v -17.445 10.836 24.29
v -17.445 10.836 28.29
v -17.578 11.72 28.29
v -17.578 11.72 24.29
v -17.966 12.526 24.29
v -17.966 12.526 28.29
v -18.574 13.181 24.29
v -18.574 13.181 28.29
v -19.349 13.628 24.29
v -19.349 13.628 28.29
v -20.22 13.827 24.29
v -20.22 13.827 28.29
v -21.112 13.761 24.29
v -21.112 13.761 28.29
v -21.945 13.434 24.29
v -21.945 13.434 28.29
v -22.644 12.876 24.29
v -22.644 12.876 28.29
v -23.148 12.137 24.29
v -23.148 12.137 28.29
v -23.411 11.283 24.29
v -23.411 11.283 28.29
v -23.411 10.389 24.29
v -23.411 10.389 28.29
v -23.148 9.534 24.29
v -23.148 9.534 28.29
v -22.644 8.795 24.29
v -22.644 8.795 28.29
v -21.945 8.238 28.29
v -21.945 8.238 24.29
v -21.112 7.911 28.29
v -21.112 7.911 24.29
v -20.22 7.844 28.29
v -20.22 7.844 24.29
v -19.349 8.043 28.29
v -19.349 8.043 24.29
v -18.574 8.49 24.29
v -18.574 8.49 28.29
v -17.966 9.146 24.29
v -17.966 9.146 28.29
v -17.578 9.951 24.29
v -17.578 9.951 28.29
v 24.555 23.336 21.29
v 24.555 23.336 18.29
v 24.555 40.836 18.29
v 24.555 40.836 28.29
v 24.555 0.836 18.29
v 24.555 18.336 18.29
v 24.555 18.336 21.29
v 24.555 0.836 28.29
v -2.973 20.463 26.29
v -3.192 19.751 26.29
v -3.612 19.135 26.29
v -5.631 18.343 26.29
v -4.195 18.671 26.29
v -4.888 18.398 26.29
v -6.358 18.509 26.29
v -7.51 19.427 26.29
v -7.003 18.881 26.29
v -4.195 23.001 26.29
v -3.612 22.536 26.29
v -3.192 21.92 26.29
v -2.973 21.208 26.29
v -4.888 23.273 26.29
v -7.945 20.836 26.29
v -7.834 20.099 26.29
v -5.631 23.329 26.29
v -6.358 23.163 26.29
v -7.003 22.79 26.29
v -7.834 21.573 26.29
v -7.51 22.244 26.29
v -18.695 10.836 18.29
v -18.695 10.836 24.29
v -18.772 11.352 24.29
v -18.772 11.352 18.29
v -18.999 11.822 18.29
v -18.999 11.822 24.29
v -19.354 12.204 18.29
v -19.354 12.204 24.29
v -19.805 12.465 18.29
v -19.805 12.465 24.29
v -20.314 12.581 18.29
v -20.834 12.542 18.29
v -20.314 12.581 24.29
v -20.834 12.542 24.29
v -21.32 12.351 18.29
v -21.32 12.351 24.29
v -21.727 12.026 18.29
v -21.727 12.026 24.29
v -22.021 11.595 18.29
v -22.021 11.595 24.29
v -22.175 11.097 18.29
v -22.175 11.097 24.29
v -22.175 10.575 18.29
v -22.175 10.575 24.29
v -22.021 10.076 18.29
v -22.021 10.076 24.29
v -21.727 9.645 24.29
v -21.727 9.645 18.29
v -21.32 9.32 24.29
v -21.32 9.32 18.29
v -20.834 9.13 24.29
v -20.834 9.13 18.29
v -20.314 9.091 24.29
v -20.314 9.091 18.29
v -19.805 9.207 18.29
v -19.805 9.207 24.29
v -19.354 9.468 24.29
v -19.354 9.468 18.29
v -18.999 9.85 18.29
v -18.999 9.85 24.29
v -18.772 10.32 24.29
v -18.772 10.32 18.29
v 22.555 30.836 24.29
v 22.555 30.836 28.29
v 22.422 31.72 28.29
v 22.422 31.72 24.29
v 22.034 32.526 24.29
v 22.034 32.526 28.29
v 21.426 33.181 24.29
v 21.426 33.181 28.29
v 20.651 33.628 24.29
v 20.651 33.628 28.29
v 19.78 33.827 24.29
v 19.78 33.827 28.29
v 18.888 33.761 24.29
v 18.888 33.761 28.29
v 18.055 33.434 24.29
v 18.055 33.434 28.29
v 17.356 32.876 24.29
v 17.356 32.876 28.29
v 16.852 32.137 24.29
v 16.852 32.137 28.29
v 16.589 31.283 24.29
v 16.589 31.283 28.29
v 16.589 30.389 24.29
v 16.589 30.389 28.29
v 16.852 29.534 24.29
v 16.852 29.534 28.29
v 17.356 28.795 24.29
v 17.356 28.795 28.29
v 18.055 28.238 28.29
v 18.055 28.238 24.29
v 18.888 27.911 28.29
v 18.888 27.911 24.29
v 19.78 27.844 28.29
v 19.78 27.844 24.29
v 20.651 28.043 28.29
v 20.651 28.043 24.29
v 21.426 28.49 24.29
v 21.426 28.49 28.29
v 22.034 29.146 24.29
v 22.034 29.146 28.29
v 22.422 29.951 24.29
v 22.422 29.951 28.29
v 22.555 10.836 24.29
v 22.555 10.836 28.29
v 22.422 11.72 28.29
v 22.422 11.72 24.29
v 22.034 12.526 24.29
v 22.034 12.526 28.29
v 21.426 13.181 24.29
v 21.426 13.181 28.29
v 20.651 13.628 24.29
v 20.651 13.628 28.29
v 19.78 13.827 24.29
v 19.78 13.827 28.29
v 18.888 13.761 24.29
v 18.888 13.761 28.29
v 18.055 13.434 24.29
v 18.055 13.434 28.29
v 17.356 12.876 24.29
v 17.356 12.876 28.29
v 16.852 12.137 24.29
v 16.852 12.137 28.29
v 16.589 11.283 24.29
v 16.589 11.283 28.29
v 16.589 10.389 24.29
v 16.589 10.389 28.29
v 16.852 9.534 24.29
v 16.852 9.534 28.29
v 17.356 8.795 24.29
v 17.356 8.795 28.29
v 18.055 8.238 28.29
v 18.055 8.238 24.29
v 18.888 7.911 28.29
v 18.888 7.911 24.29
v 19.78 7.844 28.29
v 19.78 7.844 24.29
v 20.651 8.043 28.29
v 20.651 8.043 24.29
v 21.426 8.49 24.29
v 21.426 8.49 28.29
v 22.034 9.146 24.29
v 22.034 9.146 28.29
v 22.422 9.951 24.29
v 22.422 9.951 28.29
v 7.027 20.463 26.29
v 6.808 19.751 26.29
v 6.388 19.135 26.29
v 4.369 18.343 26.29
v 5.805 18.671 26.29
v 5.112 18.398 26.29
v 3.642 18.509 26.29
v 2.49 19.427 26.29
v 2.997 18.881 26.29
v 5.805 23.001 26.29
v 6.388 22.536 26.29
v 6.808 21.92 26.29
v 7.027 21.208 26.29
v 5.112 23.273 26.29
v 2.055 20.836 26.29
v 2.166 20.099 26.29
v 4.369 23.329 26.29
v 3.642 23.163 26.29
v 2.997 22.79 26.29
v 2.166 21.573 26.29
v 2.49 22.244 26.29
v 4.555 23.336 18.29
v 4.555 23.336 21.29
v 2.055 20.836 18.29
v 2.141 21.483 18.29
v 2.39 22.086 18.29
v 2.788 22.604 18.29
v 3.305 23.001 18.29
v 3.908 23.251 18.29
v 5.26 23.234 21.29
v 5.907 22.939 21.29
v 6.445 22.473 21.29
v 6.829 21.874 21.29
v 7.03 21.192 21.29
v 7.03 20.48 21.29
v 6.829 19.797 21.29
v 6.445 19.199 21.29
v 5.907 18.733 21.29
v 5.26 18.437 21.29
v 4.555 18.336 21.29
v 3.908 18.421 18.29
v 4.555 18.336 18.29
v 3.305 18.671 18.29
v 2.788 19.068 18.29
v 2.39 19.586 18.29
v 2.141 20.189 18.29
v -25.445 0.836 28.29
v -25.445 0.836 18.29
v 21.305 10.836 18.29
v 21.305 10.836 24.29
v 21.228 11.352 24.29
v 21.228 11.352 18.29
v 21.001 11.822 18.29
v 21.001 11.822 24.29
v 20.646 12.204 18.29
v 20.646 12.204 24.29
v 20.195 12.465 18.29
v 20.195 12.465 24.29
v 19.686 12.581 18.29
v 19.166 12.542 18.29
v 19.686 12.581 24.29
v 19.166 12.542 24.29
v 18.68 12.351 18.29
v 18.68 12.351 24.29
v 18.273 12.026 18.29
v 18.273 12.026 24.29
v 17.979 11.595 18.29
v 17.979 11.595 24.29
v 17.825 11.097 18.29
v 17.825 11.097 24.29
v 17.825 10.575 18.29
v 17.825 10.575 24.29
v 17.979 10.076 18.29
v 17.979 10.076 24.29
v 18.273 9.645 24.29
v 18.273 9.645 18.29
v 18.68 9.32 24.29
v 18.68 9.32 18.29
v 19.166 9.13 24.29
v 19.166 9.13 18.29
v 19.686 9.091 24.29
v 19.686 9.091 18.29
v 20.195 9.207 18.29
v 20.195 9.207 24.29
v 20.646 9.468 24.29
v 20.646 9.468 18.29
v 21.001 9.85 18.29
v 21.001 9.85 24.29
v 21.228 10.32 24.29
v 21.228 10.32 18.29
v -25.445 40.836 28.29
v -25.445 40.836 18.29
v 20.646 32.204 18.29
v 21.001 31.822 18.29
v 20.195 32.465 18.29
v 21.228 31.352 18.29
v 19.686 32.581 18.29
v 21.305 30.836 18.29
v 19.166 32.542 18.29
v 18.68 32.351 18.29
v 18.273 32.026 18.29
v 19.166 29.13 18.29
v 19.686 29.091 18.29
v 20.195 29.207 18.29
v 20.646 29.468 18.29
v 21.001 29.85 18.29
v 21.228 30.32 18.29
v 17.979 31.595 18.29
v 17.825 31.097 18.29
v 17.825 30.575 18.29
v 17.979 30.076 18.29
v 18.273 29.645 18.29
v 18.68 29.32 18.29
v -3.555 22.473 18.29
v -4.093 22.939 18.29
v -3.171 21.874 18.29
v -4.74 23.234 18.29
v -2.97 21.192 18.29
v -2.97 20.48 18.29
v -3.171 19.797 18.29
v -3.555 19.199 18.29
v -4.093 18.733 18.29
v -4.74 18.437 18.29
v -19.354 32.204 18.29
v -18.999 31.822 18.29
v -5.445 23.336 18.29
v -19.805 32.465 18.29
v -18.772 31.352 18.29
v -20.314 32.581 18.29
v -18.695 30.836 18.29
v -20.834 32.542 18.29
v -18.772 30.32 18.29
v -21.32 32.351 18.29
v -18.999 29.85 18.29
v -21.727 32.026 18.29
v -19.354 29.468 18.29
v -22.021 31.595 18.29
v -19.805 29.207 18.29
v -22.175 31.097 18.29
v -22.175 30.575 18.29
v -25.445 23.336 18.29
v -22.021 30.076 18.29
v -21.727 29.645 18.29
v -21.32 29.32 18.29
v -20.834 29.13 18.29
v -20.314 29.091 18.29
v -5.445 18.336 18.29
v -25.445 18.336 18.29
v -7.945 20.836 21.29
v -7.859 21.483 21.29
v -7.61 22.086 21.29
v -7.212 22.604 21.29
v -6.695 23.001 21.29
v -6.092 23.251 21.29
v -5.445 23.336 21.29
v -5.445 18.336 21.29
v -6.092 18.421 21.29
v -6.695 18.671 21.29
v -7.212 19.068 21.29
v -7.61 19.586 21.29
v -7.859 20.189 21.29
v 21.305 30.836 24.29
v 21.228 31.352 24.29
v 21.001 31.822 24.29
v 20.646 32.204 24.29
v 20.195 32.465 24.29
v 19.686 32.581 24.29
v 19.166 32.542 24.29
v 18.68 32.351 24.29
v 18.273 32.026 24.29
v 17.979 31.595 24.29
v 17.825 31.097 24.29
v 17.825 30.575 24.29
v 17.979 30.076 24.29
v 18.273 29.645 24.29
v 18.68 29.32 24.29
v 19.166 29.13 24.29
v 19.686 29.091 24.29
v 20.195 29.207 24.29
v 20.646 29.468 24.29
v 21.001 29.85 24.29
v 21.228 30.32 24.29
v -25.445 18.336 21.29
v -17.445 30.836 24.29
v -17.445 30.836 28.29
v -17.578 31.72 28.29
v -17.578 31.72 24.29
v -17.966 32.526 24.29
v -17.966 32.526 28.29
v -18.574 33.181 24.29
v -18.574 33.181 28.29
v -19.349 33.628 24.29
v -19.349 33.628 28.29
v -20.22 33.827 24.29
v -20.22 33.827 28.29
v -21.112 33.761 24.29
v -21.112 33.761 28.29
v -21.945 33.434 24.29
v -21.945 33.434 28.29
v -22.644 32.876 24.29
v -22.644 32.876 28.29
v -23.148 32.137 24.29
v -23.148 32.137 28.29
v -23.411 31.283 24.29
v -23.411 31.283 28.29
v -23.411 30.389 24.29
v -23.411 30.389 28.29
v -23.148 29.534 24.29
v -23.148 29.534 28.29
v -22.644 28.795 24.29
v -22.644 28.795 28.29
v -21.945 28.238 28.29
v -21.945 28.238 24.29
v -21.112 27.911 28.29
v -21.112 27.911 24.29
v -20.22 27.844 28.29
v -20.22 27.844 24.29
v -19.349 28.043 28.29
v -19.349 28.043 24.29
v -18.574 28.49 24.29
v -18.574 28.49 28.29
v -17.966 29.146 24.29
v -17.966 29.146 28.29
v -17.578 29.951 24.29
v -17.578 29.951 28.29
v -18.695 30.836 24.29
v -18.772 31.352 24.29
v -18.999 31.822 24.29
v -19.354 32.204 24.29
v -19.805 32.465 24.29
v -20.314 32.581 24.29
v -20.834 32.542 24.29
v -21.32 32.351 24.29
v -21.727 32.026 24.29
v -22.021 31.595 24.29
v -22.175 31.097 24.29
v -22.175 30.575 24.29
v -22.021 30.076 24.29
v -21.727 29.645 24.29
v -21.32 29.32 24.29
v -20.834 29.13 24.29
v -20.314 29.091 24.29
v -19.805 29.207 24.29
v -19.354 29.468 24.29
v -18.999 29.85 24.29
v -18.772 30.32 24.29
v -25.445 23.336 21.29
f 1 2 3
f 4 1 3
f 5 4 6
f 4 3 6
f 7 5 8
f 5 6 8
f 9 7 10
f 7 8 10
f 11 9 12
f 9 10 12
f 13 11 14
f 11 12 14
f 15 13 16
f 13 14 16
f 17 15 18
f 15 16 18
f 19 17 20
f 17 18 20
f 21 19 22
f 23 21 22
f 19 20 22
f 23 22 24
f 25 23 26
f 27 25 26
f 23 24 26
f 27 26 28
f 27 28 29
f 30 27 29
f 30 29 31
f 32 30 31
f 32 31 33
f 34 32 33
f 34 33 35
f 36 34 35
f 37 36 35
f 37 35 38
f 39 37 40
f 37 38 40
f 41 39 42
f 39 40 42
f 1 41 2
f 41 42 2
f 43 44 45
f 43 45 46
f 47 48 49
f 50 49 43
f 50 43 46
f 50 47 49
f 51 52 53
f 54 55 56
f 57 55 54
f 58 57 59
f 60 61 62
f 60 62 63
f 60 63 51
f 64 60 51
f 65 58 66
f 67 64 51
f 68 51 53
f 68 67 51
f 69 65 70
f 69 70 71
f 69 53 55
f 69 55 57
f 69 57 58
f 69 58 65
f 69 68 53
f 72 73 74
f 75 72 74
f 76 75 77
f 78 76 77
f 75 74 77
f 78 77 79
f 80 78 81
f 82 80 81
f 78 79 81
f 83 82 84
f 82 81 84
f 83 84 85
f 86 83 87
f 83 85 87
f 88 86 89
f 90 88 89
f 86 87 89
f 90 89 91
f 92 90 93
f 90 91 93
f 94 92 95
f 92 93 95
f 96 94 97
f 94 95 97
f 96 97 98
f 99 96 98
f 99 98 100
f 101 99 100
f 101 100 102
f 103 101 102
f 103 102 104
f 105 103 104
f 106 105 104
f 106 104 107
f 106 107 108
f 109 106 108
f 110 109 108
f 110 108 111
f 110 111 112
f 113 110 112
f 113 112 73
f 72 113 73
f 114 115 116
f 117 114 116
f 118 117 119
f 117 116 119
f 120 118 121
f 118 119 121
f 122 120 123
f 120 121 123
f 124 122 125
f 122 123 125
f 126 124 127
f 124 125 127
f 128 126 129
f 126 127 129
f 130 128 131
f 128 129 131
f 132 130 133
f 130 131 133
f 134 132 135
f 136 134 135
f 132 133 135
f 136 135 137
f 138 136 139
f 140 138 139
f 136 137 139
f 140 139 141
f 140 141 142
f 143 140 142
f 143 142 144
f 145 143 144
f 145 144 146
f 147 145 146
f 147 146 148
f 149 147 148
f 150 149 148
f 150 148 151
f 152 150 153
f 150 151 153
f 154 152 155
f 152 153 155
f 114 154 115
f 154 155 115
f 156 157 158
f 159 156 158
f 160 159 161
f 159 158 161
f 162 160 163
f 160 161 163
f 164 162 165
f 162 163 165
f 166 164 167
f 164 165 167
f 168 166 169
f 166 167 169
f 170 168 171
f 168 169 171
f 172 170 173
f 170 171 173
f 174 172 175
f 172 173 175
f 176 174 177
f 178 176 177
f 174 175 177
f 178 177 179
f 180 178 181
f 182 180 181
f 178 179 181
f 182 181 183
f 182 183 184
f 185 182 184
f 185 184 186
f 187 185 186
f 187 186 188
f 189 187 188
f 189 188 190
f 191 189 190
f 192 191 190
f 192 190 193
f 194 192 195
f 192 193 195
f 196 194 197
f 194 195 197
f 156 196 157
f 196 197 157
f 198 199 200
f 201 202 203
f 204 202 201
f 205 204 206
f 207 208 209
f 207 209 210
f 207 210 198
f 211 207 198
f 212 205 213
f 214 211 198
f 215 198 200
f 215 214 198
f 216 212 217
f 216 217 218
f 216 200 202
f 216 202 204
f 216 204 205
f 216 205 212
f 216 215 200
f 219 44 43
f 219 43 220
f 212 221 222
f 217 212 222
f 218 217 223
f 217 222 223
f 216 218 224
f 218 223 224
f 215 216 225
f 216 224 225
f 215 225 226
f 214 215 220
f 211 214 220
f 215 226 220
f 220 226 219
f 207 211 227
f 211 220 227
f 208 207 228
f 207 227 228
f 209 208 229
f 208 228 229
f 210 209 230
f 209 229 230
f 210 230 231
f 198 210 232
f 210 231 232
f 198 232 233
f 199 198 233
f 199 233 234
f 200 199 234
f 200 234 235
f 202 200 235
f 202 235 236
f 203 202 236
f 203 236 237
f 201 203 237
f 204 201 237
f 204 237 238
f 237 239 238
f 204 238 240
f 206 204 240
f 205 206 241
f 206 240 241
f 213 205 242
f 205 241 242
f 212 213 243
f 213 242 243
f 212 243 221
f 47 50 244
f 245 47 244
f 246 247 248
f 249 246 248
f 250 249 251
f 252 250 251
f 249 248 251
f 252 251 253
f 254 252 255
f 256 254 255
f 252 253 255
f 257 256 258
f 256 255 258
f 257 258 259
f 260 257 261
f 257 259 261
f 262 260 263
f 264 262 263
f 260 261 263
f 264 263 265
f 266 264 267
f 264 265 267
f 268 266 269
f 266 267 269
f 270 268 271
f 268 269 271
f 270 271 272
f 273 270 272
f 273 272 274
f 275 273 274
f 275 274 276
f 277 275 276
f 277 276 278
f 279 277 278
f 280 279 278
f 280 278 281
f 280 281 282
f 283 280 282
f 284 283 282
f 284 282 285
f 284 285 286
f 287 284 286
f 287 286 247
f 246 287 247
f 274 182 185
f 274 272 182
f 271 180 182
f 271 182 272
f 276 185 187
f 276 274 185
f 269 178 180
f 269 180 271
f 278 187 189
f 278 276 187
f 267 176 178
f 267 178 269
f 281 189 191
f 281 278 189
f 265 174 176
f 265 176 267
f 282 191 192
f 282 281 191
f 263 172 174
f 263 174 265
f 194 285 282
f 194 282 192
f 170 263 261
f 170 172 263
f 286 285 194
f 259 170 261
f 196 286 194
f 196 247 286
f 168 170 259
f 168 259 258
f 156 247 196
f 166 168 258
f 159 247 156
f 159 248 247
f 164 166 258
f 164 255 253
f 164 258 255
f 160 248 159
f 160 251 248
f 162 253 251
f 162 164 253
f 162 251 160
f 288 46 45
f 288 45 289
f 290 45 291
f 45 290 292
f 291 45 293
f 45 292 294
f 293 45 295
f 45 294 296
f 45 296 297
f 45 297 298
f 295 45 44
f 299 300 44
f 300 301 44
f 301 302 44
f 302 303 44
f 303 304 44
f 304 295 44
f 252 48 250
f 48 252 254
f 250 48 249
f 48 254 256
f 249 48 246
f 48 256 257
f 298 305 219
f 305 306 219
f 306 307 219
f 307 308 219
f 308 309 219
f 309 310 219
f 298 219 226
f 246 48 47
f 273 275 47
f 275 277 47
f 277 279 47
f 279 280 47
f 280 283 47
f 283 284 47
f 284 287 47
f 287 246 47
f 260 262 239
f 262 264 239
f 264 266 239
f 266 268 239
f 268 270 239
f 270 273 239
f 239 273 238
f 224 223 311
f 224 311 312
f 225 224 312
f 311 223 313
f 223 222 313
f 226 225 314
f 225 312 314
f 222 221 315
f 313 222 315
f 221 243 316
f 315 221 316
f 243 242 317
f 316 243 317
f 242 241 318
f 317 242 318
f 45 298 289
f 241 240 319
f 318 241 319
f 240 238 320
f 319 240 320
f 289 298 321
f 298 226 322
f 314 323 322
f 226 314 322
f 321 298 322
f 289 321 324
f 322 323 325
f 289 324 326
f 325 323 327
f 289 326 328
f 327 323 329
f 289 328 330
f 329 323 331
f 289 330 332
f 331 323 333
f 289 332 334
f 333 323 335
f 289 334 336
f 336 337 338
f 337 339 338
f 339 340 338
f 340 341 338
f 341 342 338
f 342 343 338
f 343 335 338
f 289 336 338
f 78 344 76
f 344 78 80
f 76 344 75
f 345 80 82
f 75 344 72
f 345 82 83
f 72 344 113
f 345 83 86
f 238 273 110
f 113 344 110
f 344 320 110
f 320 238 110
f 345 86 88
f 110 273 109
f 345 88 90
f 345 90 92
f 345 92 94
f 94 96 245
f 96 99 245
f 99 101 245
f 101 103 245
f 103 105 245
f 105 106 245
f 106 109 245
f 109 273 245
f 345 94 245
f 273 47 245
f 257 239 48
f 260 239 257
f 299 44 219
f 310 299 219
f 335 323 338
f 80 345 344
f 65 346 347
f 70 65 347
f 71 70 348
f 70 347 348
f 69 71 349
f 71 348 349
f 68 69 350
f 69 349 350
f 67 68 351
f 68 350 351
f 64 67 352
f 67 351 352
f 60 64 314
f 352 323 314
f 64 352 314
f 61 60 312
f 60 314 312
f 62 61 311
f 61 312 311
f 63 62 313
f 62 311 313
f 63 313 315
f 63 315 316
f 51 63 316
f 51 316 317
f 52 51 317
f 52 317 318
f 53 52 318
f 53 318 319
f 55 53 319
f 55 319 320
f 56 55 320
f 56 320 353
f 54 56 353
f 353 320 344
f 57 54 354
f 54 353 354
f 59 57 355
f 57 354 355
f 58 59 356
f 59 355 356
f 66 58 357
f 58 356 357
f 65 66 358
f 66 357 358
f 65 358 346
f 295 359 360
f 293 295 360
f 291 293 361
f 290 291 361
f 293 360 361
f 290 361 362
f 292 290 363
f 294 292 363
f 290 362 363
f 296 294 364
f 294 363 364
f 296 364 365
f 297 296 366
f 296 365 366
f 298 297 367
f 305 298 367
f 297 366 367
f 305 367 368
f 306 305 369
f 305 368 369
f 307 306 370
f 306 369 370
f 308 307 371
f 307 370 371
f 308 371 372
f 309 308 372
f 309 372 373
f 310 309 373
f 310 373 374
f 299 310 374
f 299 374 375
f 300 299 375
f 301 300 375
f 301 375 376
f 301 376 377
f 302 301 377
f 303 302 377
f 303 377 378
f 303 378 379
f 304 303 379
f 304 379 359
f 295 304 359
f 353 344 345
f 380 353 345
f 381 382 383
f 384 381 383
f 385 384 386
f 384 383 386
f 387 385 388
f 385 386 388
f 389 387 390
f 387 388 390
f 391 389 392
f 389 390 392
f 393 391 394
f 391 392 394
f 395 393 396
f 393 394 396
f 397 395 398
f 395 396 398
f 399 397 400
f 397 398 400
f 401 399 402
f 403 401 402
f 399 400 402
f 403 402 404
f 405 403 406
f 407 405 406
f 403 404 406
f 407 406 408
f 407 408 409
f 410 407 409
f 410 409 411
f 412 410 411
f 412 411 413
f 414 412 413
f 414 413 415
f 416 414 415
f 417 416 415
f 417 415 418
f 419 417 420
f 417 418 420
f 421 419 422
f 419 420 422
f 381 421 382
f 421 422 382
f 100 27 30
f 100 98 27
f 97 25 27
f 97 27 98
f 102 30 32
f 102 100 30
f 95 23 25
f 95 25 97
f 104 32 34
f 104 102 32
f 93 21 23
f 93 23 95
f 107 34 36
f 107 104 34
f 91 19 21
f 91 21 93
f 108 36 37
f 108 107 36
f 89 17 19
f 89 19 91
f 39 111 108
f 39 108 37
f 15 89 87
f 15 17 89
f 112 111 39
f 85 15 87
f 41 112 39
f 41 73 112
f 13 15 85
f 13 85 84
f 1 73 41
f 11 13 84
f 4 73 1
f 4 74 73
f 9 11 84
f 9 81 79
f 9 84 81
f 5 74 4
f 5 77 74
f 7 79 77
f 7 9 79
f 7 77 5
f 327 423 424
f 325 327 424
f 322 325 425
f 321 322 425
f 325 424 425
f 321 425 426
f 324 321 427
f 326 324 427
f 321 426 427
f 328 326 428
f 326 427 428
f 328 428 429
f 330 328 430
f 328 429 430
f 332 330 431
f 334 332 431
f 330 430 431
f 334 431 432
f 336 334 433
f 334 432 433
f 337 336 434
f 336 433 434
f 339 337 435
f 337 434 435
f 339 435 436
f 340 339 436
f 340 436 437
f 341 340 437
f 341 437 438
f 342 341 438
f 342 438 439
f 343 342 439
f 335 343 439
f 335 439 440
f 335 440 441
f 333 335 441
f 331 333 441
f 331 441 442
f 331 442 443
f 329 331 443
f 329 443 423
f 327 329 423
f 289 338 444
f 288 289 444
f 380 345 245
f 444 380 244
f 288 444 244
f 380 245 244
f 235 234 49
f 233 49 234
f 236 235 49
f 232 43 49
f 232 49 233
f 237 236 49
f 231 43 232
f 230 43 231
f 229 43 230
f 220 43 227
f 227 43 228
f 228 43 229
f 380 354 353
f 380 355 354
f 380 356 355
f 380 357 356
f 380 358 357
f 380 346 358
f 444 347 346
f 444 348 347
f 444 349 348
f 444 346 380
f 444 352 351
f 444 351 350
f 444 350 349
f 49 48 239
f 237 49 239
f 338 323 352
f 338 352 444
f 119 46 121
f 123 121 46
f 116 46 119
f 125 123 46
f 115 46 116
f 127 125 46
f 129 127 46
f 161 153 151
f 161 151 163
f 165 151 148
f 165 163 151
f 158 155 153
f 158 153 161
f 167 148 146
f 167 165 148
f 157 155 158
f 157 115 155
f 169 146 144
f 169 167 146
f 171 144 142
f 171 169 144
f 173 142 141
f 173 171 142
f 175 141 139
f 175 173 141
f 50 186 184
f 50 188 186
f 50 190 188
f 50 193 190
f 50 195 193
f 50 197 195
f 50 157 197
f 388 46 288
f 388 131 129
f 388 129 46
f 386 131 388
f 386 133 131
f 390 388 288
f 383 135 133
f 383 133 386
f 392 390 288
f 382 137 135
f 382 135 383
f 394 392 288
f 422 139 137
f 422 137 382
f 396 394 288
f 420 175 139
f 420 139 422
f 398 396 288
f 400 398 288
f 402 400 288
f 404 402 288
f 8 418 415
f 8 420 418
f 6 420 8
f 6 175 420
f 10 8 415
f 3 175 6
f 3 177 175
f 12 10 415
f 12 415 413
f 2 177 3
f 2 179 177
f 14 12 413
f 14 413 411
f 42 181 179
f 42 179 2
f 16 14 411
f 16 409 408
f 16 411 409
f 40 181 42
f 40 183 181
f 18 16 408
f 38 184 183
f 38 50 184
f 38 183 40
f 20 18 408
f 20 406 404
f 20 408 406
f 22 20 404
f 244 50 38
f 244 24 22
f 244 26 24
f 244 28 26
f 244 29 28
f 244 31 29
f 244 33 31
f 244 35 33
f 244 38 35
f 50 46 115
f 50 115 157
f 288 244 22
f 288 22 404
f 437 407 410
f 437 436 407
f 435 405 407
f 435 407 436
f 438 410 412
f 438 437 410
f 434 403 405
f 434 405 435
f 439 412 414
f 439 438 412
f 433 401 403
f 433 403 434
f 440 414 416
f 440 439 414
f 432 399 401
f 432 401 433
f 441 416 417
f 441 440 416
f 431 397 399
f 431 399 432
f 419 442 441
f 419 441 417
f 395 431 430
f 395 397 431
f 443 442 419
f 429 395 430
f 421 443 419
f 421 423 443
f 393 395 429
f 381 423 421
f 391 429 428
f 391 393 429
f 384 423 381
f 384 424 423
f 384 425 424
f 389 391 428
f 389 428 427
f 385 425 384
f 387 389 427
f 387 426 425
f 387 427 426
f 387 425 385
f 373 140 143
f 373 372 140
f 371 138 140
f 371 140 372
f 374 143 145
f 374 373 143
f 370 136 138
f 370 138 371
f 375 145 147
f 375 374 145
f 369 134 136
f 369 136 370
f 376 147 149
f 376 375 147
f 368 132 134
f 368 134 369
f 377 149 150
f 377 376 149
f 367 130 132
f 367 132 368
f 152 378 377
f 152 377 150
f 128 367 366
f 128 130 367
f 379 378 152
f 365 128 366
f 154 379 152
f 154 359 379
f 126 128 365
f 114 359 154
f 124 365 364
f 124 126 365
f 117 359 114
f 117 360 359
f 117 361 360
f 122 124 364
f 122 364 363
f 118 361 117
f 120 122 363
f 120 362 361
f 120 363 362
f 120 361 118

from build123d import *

# Parameters (mm, degrees)
SKETCH1_W           = 50
SKETCH1_H           = 10
BOSS_EXTRUDE1_DEPTH = 40
CUT_EXTRUDE1_REACH  = 12
SKETCH2_R           = 1.75
SKETCH3_R           = 3
CUT_EXTRUDE2_DEPTH  = 4
SKETCH5_R           = 2.5
CUT_EXTRUDE3_DEPTH  = 8
SKETCH6_W           = 20
SKETCH6_H           = 5
CUT_EXTRUDE4_DEPTH  = 3


with BuildPart() as part:
    # Sketch1 → Boss-Extrude1 (new body)
    with BuildSketch(Plane(origin=(0, 0.83575208, 0), x_dir=(-1, 0, 0), z_dir=(0, 1, 0))):
        with Locations((0.444640388, 23.28984466)):
            Rectangle(SKETCH1_W, SKETCH1_H)
    extrude(amount=BOSS_EXTRUDE1_DEPTH)

    # Sketch2 → Cut-Extrude1 (cut, up to next)
    with BuildSketch(Plane.XY.offset(28.28984466), mode=Mode.PRIVATE) as cut_extrude1_sk1:
        with Locations((-20.444640388, 30.83575208)):
            Circle(SKETCH2_R)
    cut_extrude1_tool1 = extrude(cut_extrude1_sk1.sketch, amount=-CUT_EXTRUDE1_REACH, mode=Mode.PRIVATE) & part.part
    add(cut_extrude1_tool1.solids().sort_by_distance((-20.44464, 30.835752, 28.289845))[0], mode=Mode.SUBTRACT)
    # Sketch2 → Cut-Extrude1 (cut, up to next)
    with BuildSketch(Plane.XY.offset(28.28984466), mode=Mode.PRIVATE) as cut_extrude1_sk2:
        with Locations((-20.444640388, 10.83575208)):
            Circle(SKETCH2_R)
    cut_extrude1_tool2 = extrude(cut_extrude1_sk2.sketch, amount=-CUT_EXTRUDE1_REACH, mode=Mode.PRIVATE) & part.part
    add(cut_extrude1_tool2.solids().sort_by_distance((-20.44464, 10.835752, 28.289845))[0], mode=Mode.SUBTRACT)
    # Sketch2 → Cut-Extrude1 (cut, up to next)
    with BuildSketch(Plane.XY.offset(28.28984466), mode=Mode.PRIVATE) as cut_extrude1_sk3:
        with Locations((19.555359612, 10.83575208)):
            Circle(SKETCH2_R)
    cut_extrude1_tool3 = extrude(cut_extrude1_sk3.sketch, amount=-CUT_EXTRUDE1_REACH, mode=Mode.PRIVATE) & part.part
    add(cut_extrude1_tool3.solids().sort_by_distance((19.55536, 10.835752, 28.289845))[0], mode=Mode.SUBTRACT)
    # Sketch2 → Cut-Extrude1 (cut, up to next)
    with BuildSketch(Plane.XY.offset(28.28984466), mode=Mode.PRIVATE) as cut_extrude1_sk4:
        with Locations((19.555359612, 30.83575208)):
            Circle(SKETCH2_R)
    cut_extrude1_tool4 = extrude(cut_extrude1_sk4.sketch, amount=-CUT_EXTRUDE1_REACH, mode=Mode.PRIVATE) & part.part
    add(cut_extrude1_tool4.solids().sort_by_distance((19.55536, 30.835752, 28.289845))[0], mode=Mode.SUBTRACT)

    # Sketch3 → Cut-Extrude2 (cut)
    with BuildSketch(Plane.XY.offset(28.28984466)):
        with Locations((-20.444640388, 30.83575208)):
            Circle(SKETCH3_R)
        with Locations((-20.444640388, 10.83575208)):
            Circle(SKETCH3_R)
        with Locations((19.555359612, 10.83575208)):
            Circle(SKETCH3_R)
        with Locations((19.555359612, 30.83575208)):
            Circle(SKETCH3_R)
    extrude(amount=-CUT_EXTRUDE2_DEPTH, mode=Mode.SUBTRACT)

    # Sketch5 → Cut-Extrude3 (cut)
    with BuildSketch(Plane(origin=(0, 0, 18.28984466), x_dir=(-1, 0, 0), z_dir=(0, 0, -1))):
        with Locations((5.444640388, 20.83575208)):
            Circle(SKETCH5_R)
        with Locations((-4.555359612, 20.83575208)):
            Circle(SKETCH5_R)
    extrude(amount=-CUT_EXTRUDE3_DEPTH, mode=Mode.SUBTRACT)

    # Sketch6 → Cut-Extrude4 (cut)
    with BuildSketch(Plane(origin=(0, 0, 18.28984466), x_dir=(-1, 0, 0), z_dir=(0, 0, -1))):
        with Locations((15.444640388, 20.83575208)):
            Rectangle(SKETCH6_W, SKETCH6_H)
        with Locations((-14.555359612, 20.83575208)):
            Rectangle(SKETCH6_W, SKETCH6_H)
    extrude(amount=-CUT_EXTRUDE4_DEPTH, mode=Mode.SUBTRACT)


solid = part.part
